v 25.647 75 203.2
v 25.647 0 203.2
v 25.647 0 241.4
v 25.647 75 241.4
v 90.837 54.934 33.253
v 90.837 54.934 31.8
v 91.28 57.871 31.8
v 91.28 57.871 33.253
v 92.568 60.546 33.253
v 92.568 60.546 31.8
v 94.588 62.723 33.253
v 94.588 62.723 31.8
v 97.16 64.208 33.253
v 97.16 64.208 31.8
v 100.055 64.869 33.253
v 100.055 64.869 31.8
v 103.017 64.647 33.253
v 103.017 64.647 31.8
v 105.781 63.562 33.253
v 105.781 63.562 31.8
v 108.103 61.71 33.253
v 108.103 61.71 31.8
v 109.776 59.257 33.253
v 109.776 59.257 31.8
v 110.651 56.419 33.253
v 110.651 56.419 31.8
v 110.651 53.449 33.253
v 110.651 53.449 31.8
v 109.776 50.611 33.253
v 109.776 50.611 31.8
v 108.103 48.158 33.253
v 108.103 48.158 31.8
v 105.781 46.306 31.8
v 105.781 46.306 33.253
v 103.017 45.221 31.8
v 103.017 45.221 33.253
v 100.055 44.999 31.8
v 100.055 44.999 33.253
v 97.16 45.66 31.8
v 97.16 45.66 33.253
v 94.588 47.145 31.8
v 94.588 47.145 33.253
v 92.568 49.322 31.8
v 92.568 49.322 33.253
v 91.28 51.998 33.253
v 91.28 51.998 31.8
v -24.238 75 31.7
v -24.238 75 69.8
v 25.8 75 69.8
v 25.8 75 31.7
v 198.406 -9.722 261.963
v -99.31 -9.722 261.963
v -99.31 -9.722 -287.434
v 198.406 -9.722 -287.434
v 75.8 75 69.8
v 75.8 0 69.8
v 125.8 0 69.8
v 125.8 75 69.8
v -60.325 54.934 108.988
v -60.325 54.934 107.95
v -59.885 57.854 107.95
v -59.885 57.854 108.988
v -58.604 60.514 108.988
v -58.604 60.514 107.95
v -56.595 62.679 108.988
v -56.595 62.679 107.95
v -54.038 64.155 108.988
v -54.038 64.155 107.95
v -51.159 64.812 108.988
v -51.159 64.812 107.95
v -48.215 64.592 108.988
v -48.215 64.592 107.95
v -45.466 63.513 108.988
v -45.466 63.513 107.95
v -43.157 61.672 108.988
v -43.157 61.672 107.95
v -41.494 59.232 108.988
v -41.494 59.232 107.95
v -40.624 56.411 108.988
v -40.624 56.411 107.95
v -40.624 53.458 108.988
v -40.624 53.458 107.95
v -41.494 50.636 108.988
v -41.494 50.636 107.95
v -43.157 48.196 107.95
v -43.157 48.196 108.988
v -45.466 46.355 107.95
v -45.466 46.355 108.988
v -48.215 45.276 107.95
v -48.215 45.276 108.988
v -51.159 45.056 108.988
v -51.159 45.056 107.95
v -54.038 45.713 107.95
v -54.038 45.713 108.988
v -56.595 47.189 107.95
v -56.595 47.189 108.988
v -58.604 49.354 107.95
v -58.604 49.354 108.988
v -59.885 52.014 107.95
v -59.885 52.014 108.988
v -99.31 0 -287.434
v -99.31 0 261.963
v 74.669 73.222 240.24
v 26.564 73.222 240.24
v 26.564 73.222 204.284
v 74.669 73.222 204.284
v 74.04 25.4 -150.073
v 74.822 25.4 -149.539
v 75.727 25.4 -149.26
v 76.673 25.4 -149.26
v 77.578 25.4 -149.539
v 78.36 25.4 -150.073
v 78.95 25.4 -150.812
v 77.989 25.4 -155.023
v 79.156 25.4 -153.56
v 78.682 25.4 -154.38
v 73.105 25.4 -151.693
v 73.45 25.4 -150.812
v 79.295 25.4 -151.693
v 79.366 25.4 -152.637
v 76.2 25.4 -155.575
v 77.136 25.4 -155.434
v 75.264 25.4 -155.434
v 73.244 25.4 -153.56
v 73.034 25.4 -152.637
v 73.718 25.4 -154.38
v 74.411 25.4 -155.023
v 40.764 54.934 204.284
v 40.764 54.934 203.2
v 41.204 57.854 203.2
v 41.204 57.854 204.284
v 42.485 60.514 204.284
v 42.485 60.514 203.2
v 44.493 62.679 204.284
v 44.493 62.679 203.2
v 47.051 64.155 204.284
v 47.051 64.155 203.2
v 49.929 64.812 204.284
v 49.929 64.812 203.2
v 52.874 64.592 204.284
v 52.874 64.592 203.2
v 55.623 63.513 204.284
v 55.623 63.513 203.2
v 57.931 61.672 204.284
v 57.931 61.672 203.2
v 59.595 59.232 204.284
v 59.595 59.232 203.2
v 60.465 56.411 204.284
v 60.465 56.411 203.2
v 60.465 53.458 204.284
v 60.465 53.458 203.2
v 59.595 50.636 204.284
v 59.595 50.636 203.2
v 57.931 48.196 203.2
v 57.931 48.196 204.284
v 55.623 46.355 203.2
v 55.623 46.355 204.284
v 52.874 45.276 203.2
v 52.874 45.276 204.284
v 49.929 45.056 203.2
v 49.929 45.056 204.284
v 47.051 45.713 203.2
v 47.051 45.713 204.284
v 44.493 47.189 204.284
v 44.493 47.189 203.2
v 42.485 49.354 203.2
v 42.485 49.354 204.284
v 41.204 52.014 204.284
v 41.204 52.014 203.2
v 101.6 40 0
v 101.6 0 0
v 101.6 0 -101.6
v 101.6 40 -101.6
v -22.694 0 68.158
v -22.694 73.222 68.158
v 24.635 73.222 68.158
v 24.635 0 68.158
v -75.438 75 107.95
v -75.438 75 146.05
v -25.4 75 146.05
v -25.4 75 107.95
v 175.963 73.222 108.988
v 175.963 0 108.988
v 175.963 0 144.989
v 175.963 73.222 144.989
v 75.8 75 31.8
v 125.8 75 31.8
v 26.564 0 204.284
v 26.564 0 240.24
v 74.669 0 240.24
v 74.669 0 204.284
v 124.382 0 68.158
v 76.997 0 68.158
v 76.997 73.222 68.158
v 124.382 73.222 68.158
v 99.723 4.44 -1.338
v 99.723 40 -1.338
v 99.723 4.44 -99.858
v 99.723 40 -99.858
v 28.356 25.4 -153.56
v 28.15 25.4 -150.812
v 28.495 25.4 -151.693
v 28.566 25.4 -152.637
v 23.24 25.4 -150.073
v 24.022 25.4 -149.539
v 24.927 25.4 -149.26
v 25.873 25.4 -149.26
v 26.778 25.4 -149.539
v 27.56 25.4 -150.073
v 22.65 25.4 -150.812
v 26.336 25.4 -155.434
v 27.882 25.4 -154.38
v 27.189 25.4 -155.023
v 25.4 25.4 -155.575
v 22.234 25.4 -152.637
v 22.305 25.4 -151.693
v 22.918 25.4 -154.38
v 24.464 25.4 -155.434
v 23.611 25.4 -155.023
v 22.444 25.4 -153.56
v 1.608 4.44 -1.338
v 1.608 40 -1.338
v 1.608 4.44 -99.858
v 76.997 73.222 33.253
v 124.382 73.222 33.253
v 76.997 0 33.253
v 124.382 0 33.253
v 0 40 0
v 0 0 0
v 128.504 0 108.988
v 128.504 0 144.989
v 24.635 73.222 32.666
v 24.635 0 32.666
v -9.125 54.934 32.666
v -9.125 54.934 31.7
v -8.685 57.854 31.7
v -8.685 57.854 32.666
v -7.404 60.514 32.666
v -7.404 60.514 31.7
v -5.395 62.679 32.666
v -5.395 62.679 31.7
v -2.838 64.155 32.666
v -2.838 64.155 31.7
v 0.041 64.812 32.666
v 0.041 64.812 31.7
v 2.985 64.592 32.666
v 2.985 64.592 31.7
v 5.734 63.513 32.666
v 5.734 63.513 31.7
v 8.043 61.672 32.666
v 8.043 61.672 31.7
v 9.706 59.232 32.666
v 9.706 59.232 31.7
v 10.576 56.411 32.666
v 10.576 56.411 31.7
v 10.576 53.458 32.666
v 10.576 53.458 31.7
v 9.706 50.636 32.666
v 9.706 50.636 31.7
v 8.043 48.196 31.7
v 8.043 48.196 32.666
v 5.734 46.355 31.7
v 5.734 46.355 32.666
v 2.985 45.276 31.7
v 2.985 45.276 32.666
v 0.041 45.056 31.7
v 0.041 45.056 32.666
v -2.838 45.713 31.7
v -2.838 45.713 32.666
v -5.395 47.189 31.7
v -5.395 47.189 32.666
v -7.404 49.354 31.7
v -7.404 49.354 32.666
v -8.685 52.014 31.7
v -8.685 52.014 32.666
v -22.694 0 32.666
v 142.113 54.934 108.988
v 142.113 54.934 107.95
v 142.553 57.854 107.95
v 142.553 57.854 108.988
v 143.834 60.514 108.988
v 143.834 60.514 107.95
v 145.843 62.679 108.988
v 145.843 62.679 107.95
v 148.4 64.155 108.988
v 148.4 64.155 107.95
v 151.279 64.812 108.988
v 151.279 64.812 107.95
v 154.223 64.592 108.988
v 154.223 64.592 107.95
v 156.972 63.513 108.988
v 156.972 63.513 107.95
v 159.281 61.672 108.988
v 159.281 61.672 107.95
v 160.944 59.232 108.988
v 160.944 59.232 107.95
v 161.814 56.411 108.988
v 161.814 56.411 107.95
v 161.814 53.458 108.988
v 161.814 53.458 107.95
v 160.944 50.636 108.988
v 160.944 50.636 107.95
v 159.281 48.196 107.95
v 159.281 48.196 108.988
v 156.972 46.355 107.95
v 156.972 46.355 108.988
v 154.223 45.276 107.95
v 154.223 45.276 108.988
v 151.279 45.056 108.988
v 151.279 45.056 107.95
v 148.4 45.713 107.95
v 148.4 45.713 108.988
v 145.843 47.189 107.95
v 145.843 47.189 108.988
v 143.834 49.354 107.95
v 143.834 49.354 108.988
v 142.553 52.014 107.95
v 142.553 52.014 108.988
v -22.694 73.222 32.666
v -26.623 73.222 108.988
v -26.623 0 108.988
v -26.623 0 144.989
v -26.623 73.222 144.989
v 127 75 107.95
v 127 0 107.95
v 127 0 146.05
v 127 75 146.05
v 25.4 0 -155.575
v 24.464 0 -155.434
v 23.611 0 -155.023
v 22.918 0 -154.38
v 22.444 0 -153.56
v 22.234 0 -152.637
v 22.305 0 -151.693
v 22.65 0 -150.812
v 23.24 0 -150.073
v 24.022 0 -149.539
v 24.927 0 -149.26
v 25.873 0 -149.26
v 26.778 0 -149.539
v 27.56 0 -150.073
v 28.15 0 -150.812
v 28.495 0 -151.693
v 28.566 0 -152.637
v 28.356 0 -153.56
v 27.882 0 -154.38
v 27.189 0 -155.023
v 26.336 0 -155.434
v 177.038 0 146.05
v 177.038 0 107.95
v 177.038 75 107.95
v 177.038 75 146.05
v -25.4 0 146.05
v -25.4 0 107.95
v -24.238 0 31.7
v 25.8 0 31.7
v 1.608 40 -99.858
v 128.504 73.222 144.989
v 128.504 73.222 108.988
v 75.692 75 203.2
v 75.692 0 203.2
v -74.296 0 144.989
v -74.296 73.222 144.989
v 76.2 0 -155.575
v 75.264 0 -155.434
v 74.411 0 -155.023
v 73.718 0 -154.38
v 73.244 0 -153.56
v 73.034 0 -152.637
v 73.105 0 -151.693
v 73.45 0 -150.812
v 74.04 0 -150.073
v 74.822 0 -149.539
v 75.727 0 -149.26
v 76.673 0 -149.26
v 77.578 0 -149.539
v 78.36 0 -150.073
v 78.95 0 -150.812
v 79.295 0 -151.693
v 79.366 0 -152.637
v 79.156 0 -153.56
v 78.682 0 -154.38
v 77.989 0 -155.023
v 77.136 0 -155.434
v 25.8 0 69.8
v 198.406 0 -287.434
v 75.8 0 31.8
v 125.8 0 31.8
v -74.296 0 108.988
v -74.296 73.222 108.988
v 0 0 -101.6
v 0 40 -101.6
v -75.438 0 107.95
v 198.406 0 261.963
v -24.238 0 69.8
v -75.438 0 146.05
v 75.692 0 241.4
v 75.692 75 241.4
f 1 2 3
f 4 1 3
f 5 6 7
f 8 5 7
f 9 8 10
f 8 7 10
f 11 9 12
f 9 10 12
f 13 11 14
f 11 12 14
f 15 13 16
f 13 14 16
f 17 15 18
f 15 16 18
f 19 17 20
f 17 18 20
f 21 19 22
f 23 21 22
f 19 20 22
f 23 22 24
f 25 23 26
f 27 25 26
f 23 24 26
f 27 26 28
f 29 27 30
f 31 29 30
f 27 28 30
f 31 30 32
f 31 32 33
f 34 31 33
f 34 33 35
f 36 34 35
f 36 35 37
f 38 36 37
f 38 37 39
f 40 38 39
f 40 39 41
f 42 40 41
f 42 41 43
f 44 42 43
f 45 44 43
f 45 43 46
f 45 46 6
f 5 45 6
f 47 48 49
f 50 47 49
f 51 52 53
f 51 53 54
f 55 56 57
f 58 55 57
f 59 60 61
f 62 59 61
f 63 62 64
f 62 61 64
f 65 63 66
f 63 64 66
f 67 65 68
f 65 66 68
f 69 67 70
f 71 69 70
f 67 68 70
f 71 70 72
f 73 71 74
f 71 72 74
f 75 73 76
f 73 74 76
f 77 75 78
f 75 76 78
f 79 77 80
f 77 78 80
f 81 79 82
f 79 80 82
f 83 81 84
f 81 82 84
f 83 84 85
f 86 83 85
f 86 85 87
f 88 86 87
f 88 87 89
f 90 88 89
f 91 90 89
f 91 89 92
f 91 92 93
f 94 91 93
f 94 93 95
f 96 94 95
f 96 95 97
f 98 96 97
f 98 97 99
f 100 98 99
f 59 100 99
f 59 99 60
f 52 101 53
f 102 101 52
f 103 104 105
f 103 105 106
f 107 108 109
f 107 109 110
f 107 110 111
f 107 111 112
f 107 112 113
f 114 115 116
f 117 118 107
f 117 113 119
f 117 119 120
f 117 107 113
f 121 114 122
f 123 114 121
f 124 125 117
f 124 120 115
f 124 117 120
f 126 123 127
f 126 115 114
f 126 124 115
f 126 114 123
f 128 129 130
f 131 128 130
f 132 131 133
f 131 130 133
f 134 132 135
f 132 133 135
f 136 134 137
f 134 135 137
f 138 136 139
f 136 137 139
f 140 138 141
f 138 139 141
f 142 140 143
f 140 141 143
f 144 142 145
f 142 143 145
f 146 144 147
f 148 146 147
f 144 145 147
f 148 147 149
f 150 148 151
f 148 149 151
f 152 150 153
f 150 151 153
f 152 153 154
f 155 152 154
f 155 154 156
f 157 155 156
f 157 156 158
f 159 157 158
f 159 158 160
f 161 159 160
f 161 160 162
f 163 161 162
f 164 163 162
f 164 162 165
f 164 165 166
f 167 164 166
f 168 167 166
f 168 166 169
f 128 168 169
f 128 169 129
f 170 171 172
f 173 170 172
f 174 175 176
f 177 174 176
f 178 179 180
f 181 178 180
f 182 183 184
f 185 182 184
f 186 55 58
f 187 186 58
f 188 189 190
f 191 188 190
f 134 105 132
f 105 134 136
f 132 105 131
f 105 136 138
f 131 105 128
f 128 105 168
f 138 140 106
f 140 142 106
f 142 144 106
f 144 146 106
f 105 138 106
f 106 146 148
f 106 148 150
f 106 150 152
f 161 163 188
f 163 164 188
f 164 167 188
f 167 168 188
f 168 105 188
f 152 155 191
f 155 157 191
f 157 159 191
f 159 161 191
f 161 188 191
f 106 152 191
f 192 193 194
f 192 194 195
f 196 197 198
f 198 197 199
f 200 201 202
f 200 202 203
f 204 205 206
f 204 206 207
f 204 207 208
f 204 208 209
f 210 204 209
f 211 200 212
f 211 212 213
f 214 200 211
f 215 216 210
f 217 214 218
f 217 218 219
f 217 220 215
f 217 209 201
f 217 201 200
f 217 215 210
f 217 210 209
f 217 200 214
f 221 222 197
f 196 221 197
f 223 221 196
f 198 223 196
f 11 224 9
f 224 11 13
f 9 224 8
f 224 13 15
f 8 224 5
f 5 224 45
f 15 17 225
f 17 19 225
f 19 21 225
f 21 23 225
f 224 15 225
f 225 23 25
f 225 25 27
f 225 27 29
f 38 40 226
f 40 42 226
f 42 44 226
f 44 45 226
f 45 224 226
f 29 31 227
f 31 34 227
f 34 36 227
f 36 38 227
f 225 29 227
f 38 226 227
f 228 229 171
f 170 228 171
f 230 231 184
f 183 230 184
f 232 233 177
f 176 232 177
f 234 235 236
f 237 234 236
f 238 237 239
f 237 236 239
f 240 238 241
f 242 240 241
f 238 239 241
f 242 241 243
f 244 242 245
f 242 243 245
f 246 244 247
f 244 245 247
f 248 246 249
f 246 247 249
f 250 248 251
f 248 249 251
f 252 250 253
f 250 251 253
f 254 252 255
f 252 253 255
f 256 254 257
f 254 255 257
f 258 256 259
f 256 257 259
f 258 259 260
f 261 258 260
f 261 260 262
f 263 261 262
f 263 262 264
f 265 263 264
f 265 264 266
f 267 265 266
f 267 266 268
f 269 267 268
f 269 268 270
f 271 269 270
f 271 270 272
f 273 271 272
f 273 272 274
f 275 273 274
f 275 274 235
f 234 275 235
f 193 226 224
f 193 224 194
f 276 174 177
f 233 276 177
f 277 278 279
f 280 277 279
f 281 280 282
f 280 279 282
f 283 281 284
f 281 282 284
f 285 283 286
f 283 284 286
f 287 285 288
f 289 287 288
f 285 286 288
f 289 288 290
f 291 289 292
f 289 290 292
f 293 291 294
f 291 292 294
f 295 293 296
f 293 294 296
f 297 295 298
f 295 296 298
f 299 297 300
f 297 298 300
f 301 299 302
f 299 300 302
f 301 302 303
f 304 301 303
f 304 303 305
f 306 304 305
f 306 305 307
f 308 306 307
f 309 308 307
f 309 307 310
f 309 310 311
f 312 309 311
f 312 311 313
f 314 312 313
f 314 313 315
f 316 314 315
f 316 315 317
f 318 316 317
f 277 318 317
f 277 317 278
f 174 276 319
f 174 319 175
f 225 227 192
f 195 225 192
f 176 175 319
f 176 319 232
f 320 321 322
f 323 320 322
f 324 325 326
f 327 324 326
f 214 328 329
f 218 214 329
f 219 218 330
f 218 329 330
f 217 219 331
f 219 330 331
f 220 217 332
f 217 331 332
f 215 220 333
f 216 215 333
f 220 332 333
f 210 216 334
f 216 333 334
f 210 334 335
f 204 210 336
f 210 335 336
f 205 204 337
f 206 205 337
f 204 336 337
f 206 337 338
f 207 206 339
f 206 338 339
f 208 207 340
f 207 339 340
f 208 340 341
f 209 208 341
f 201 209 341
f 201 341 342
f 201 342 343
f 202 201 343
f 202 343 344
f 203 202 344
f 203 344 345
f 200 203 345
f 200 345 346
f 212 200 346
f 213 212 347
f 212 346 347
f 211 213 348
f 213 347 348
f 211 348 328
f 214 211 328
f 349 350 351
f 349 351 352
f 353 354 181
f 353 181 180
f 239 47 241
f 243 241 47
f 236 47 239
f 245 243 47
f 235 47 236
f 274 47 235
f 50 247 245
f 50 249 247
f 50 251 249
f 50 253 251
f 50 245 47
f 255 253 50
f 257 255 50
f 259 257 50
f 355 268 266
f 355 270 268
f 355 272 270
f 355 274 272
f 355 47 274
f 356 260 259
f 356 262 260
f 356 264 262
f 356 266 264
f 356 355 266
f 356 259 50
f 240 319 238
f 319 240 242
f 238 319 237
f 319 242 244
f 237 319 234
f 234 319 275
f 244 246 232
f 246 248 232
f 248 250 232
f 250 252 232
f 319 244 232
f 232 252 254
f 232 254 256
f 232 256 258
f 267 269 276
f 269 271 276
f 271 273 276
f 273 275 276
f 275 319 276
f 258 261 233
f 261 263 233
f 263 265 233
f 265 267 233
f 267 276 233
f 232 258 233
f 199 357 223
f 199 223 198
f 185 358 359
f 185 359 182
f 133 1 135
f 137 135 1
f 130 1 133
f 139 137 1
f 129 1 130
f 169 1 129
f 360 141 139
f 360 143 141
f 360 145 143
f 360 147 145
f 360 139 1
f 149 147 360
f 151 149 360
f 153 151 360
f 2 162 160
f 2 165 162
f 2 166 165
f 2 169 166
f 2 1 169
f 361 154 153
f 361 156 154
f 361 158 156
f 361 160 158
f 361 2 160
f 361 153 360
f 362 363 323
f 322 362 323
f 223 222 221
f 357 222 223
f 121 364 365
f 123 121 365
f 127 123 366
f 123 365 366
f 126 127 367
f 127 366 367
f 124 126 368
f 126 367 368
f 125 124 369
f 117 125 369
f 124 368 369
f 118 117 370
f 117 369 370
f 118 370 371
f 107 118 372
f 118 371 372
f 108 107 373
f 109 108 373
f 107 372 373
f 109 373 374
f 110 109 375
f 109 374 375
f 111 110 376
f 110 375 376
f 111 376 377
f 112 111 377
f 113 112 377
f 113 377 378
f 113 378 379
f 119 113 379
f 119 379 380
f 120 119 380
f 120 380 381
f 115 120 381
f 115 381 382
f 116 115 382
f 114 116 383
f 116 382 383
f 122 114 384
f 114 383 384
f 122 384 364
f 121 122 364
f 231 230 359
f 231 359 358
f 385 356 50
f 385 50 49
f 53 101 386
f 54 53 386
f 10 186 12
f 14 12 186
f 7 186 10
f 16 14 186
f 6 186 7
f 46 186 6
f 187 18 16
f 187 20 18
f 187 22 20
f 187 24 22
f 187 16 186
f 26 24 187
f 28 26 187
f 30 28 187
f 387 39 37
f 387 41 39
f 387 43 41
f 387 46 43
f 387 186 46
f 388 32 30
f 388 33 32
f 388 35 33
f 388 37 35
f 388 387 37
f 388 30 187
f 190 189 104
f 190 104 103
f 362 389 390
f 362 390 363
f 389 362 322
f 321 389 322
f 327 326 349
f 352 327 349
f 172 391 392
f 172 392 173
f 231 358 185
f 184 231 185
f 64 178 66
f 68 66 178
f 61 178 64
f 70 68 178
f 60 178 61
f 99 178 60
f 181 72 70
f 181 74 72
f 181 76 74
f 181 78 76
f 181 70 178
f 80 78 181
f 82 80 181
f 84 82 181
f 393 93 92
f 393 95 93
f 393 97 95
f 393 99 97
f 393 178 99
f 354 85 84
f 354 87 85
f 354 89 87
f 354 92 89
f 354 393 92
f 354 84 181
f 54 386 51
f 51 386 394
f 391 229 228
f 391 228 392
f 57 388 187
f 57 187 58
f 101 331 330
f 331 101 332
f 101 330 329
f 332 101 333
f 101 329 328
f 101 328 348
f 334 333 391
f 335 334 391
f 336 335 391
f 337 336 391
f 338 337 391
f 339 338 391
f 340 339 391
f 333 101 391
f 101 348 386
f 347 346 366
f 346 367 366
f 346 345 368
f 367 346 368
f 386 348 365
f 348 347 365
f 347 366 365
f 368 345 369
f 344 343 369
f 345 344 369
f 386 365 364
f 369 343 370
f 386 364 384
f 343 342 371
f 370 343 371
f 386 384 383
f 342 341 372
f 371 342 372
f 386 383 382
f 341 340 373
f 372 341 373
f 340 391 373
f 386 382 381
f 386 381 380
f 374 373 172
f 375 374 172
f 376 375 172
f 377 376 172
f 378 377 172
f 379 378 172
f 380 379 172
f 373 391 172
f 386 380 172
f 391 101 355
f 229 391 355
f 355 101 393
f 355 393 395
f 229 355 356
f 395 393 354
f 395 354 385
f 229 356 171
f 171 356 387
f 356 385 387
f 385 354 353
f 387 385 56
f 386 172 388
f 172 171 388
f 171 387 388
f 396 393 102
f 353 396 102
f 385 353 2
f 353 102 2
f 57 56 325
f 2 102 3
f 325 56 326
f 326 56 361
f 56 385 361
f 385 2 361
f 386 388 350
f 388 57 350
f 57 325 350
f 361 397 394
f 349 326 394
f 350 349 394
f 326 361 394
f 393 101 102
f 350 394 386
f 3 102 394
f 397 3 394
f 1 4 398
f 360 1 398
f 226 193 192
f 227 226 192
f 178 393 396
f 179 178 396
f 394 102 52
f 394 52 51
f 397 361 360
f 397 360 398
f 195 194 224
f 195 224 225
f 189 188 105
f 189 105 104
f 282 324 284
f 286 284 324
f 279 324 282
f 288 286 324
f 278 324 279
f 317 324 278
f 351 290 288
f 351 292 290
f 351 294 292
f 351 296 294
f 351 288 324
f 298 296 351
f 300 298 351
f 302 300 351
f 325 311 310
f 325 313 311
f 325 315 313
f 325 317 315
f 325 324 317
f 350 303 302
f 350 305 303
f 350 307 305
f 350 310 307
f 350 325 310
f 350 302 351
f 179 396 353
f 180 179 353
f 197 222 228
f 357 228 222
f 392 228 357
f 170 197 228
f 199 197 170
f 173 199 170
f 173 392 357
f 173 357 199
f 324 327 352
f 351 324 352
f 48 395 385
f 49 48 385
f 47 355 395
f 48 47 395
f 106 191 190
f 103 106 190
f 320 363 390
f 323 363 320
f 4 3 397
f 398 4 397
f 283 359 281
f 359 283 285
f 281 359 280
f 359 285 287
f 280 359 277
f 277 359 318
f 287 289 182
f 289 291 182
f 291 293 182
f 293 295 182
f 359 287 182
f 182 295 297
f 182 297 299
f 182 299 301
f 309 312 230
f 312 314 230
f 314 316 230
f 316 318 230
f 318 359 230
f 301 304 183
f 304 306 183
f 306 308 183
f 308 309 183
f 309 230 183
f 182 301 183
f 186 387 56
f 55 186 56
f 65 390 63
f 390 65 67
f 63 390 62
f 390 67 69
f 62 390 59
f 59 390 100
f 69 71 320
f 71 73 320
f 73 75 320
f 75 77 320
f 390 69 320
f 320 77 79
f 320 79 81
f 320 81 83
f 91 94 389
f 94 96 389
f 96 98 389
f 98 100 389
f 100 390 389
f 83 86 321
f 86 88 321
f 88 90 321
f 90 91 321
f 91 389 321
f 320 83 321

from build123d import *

# Parameters (mm, degrees)
SKETCH1_W             = 101.6
SKETCH1_H             = 101.6
BOSS_EXTRUDE1_DEPTH   = 39.99992
SKETCH2_W             = 98.115054024
SKETCH2_H             = 98.519374302
CUT_EXTRUDE1_DEPTH    = 35.56
SKETCH3_W             = 49.9999
SKETCH3_H             = 37.999924
BOSS_EXTRUDE2_DEPTH   = 75.000104
SKETCH3_W_2           = 50.038
SKETCH3_H_2           = 38.1
BOSS_EXTRUDE2_2_DEPTH = 75.000104
BOSS_EXTRUDE2_3_DEPTH = 75.000104
BOSS_EXTRUDE2_4_DEPTH = 75.000104
SKETCH3_W_3           = 50.044709845
SKETCH3_H_3           = 38.200481576
BOSS_EXTRUDE2_5_DEPTH = 75.000104
SKETCH4_W             = 47.673303357
SKETCH4_H             = 36.001078641
SKETCH4_W_2           = 47.329126014
SKETCH4_H_2           = 35.49131434
SKETCH4_W_3           = 47.385353059
SKETCH4_H_3           = 34.904518915
SKETCH4_W_4           = 47.458878428
SKETCH4_W_5           = 48.104938799
SKETCH4_H_4           = 35.956464733
CUT_EXTRUDE2_DEPTH    = 73.222104
SKETCH5_R             = 9.906
SKETCH5_R_2           = 9.962701018
CUT_EXTRUDE3_DEPTH    = 9.722104
SKETCH6_R             = 9.906
CUT_EXTRUDE4_DEPTH    = 9.722104
SKETCH7_R             = 9.906
CUT_EXTRUDE5_DEPTH    = 9.722104
SKETCH8_W             = 297.716106252
SKETCH8_H             = 549.396882706
BOSS_EXTRUDE4_DEPTH   = 9.722104
SKETCH9_R             = 3.175
BOSS_EXTRUDE5_DEPTH   = 25.4


with BuildPart() as part:
    # Sketch1 → Boss-Extrude1 (new body)
    with BuildSketch(Plane(origin=(0, 0, 0), x_dir=(1, 0, 0), z_dir=(0, 1, 0))):
        with Locations((50.8, 50.8)):
            Rectangle(SKETCH1_W, SKETCH1_H)
    extrude(amount=BOSS_EXTRUDE1_DEPTH)

    # Sketch2 → Cut-Extrude1 (cut)
    with BuildSketch(Plane(origin=(0, 39.99992, 0), x_dir=(1, 0, 0), z_dir=(0, 1, 0))):
        with Locations((50.665226574, 50.597839861)):
            Rectangle(SKETCH2_W, SKETCH2_H)
    extrude(amount=-CUT_EXTRUDE1_DEPTH, mode=Mode.SUBTRACT)



with BuildPart() as body_2:
    # Sketch3 → Boss-Extrude2 (new body)
    with BuildSketch(Plane.XZ):
        with Locations((100.7999508, 50.8000254)):
            Rectangle(SKETCH3_W, SKETCH3_H)
    extrude(amount=-BOSS_EXTRUDE2_DEPTH)


with BuildPart() as body_3:
    # Sketch3 → Boss-Extrude2 2 (new body)
    with BuildSketch(Plane.XZ):
        with Locations((0.7809992, 50.7499874)):
            Rectangle(SKETCH3_W_2, SKETCH3_H_2)
    extrude(amount=-BOSS_EXTRUDE2_2_DEPTH)


with BuildPart() as body_4:
    # Sketch3 → Boss-Extrude2 3 (new body)
    with BuildSketch(Plane.XZ):
        with Locations((152.019, 127)):
            Rectangle(SKETCH3_W_2, SKETCH3_H_2)
    extrude(amount=-BOSS_EXTRUDE2_3_DEPTH)


with BuildPart() as body_5:
    # Sketch3 → Boss-Extrude2 4 (new body)
    with BuildSketch(Plane.XZ):
        with Locations((-50.419, 127)):
            Rectangle(SKETCH3_W_2, SKETCH3_H_2)
    extrude(amount=-BOSS_EXTRUDE2_4_DEPTH)


with BuildPart() as body_6:
    # Sketch3 → Boss-Extrude2 5 (new body)
    with BuildSketch(Plane.XZ):
        with Locations((50.669645078, 222.300240788)):
            Rectangle(SKETCH3_W_3, SKETCH3_H_3)
    extrude(amount=-BOSS_EXTRUDE2_5_DEPTH)


with BuildPart() as cut_extrude2_tool:
    # Sketch4 → Cut-Extrude2 (new body)
    with BuildSketch(Plane.XZ):
        with Locations((-50.459366902, 126.988435685)):
            Rectangle(SKETCH4_W, SKETCH4_H)
        with Locations((0.970104392, 50.412109166)):
            Rectangle(SKETCH4_W_2, SKETCH4_H_2)
        with Locations((100.689433749, 50.705506879)):
            Rectangle(SKETCH4_W_3, SKETCH4_H_3)
        with Locations((152.233471247, 126.988435685)):
            Rectangle(SKETCH4_W_4, SKETCH4_H)
        with Locations((50.616530906, 222.262061552)):
            Rectangle(SKETCH4_W_5, SKETCH4_H_4)
    extrude(amount=-CUT_EXTRUDE2_DEPTH)


with BuildPart() as body_2_1:
    add(body_2.part)

    # Cut-Extrude2: cut by cut_extrude2_tool
    add(cut_extrude2_tool.part, mode=Mode.SUBTRACT)


with BuildPart() as body_3_1:
    add(body_3.part)

    # Cut-Extrude2: cut by cut_extrude2_tool
    add(cut_extrude2_tool.part, mode=Mode.SUBTRACT)


with BuildPart() as body_4_1:
    add(body_4.part)

    # Cut-Extrude2: cut by cut_extrude2_tool
    add(cut_extrude2_tool.part, mode=Mode.SUBTRACT)


with BuildPart() as body_5_1:
    add(body_5.part)

    # Cut-Extrude2: cut by cut_extrude2_tool
    add(cut_extrude2_tool.part, mode=Mode.SUBTRACT)


with BuildPart() as body_6_1:
    add(body_6.part)

    # Cut-Extrude2: cut by cut_extrude2_tool
    add(cut_extrude2_tool.part, mode=Mode.SUBTRACT)

    # Sketch7 → Cut-Extrude5 (cut)
    with BuildSketch(Plane(origin=(0, 0, 203.2), x_dir=(-1, 0, 0), z_dir=(0, 0, -1))):
        with Locations((-50.669645078, 54.934104)):
            Circle(SKETCH7_R)
    extrude(amount=-CUT_EXTRUDE5_DEPTH, mode=Mode.SUBTRACT)


with BuildPart() as cut_extrude3_tool:
    # Sketch5 → Cut-Extrude3 (new body)
    with BuildSketch(Plane(origin=(0, 0, 31.6999874), x_dir=(-1, 0, 0), z_dir=(0, 0, -1))):
        with Locations((-0.7809992, 54.934104)):
            Circle(SKETCH5_R)
        with Locations((-100.7999508, 54.934104)):
            Circle(SKETCH5_R_2)
    extrude(amount=-CUT_EXTRUDE3_DEPTH)


with BuildPart() as body_2_2:
    add(body_2_1.part)

    # Cut-Extrude3: cut by cut_extrude3_tool
    add(cut_extrude3_tool.part, mode=Mode.SUBTRACT)


with BuildPart() as body_3_2:
    add(body_3_1.part)

    # Cut-Extrude3: cut by cut_extrude3_tool
    add(cut_extrude3_tool.part, mode=Mode.SUBTRACT)


with BuildPart() as cut_extrude4_tool:
    # Sketch6 → Cut-Extrude4 (new body)
    with BuildSketch(Plane(origin=(0, 0, 107.95), x_dir=(-1, 0, 0), z_dir=(0, 0, -1))):
        with Locations((-152.019, 54.934104)):
            Circle(SKETCH6_R)
        with Locations((50.419, 54.934104)):
            Circle(SKETCH6_R)
    extrude(amount=-CUT_EXTRUDE4_DEPTH)


with BuildPart() as body_4_2:
    add(body_4_1.part)

    # Cut-Extrude4: cut by cut_extrude4_tool
    add(cut_extrude4_tool.part, mode=Mode.SUBTRACT)


with BuildPart() as body_5_2:
    add(body_5_1.part)

    # Cut-Extrude4: cut by cut_extrude4_tool
    add(cut_extrude4_tool.part, mode=Mode.SUBTRACT)


with BuildPart() as part_1:
    add(part.part)

    add(body_2_2.part)  # Boss-Extrude4 merges body 2

    add(body_3_2.part)  # Boss-Extrude4 merges body 3

    add(body_4_2.part)  # Boss-Extrude4 merges body 4

    add(body_5_2.part)  # Boss-Extrude4 merges body 5

    add(body_6_1.part)  # Boss-Extrude4 merges body 6
    # Sketch8 → Boss-Extrude4 (add)
    with BuildSketch(Plane.XZ):
        with Locations((49.547758626, -12.735627368)):
            Rectangle(SKETCH8_W, SKETCH8_H)
    extrude(amount=BOSS_EXTRUDE4_DEPTH)

    # Sketch9 → Boss-Extrude5 (add)
    with BuildSketch(Plane(origin=(0, 0, 0), x_dir=(1, 0, 0), z_dir=(0, 1, 0))):
        with Locations(Location((25.4, 152.4, 0), (0, 0, 90))):
            Circle(SKETCH9_R)
        with Locations(Location((76.2, 152.4, 0), (0, 0, 90))):
            Circle(SKETCH9_R)
    extrude(amount=BOSS_EXTRUDE5_DEPTH)


solid = part_1.part
